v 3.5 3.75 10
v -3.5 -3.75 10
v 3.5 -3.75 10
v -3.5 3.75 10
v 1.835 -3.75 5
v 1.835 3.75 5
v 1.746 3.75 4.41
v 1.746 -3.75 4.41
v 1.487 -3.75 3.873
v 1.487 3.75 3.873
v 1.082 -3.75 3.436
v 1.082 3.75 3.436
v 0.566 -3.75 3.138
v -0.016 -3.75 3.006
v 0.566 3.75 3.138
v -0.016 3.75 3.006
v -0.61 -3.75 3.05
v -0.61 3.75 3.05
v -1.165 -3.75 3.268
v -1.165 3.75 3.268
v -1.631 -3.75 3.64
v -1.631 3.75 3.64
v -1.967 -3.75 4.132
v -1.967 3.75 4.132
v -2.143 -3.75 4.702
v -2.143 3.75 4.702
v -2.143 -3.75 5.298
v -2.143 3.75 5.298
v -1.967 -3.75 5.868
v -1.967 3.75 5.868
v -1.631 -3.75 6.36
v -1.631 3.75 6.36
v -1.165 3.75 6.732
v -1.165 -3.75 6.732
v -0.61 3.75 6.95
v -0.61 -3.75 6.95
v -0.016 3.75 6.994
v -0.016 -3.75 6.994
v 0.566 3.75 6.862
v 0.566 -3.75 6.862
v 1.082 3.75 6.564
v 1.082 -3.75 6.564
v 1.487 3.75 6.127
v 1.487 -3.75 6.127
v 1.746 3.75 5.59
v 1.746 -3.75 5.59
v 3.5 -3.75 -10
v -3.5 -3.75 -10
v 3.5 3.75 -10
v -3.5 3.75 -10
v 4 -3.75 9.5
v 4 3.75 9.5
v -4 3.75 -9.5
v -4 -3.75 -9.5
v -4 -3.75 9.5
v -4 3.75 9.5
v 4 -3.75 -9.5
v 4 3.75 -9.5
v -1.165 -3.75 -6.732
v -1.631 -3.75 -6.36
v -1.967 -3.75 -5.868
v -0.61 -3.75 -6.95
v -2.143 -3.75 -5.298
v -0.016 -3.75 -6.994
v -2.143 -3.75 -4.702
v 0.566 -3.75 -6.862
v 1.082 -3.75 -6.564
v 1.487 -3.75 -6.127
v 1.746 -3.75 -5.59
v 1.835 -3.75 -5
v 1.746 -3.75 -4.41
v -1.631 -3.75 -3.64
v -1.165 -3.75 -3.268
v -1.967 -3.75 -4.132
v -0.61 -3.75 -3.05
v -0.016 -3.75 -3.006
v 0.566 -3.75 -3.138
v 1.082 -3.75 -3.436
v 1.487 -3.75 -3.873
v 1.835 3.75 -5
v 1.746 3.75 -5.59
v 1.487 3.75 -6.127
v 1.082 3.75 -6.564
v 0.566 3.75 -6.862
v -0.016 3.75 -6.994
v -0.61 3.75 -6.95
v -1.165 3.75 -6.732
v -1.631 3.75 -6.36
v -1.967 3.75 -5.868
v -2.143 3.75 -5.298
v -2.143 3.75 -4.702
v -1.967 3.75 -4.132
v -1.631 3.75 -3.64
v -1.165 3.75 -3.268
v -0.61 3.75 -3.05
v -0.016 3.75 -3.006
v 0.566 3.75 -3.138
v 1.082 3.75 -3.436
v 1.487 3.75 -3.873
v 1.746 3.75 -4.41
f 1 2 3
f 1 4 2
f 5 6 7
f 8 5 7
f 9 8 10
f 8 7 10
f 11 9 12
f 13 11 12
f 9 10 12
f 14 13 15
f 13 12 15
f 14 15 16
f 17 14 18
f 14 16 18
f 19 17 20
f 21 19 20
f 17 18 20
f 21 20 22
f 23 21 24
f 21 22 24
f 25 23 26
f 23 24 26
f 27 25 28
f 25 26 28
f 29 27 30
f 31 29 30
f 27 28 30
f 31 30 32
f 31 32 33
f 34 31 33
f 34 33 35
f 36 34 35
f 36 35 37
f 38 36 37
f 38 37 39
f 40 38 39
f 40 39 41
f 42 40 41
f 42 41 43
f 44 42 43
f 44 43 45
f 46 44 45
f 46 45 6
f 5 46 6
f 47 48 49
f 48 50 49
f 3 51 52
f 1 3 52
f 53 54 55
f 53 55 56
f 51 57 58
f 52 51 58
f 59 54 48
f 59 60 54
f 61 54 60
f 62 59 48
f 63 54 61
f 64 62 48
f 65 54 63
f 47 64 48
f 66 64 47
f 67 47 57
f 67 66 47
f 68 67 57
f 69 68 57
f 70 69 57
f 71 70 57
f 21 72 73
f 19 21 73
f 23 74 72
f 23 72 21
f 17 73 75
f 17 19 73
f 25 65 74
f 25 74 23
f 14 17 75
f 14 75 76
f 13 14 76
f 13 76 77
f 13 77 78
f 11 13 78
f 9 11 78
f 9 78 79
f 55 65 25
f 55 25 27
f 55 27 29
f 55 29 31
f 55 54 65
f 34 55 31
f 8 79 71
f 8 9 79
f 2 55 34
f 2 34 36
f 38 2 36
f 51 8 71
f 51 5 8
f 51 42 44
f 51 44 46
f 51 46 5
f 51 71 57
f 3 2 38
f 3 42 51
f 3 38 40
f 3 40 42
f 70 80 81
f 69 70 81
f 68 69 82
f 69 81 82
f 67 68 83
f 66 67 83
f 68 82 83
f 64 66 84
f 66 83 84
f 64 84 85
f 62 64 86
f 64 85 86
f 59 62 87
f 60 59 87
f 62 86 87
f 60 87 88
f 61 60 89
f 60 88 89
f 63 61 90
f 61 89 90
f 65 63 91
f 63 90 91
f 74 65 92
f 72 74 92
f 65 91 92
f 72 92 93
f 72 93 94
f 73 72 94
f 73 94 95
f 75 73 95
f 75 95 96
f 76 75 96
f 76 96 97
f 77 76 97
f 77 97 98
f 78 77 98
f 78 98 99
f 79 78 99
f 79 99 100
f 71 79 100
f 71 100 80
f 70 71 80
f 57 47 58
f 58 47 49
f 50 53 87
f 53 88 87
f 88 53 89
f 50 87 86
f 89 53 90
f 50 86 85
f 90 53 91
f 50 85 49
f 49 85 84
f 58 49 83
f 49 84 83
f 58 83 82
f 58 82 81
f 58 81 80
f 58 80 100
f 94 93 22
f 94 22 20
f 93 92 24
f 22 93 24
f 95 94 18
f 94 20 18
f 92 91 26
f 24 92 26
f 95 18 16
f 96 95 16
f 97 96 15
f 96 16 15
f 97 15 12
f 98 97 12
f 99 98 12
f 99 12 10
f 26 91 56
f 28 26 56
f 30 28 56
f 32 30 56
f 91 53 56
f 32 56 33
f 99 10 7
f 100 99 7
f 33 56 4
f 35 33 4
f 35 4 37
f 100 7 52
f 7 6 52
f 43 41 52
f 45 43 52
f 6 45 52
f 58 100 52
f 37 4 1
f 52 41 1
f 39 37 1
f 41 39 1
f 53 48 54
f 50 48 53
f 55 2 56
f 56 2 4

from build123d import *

# Parameters (mm, degrees)
SKETCH_1_W            = 8
SKETCH_1_H            = 7.5
EXTRUDE_1_DEPTH       = 10
CHAMFER_1_SIZE        = 0.5
HOLE_WIZARD_4_0_4_1_D = 4


with BuildPart() as part:
    # 草图1 → 凸台-拉伸1 (new, symmetric)
    with BuildSketch(Plane.XY):
        Rectangle(SKETCH_1_W, SKETCH_1_H)
    extrude(amount=EXTRUDE_1_DEPTH, both=True)

    # 倒角1
    chamfer_1_edges = [part.edges().sort_by_distance(p)[0] for p in [
        (4, 0, 10),
        (-4, 0, 10),
        (4, 0, -10),
        (-4, 0, -10),
    ]]
    chamfer(chamfer_1_edges, length=CHAMFER_1_SIZE)

    # Ø4.0 (4) 直径孔1 (through all)
    with Locations(Plane(origin=(51.8, -3.75, -33), x_dir=(-1, 0, 0), z_dir=(0, -1, 0))):
        with Locations((51.965, -38), (51.965, -28)):
            Hole(HOLE_WIZARD_4_0_4_1_D / 2)


solid = part.part
